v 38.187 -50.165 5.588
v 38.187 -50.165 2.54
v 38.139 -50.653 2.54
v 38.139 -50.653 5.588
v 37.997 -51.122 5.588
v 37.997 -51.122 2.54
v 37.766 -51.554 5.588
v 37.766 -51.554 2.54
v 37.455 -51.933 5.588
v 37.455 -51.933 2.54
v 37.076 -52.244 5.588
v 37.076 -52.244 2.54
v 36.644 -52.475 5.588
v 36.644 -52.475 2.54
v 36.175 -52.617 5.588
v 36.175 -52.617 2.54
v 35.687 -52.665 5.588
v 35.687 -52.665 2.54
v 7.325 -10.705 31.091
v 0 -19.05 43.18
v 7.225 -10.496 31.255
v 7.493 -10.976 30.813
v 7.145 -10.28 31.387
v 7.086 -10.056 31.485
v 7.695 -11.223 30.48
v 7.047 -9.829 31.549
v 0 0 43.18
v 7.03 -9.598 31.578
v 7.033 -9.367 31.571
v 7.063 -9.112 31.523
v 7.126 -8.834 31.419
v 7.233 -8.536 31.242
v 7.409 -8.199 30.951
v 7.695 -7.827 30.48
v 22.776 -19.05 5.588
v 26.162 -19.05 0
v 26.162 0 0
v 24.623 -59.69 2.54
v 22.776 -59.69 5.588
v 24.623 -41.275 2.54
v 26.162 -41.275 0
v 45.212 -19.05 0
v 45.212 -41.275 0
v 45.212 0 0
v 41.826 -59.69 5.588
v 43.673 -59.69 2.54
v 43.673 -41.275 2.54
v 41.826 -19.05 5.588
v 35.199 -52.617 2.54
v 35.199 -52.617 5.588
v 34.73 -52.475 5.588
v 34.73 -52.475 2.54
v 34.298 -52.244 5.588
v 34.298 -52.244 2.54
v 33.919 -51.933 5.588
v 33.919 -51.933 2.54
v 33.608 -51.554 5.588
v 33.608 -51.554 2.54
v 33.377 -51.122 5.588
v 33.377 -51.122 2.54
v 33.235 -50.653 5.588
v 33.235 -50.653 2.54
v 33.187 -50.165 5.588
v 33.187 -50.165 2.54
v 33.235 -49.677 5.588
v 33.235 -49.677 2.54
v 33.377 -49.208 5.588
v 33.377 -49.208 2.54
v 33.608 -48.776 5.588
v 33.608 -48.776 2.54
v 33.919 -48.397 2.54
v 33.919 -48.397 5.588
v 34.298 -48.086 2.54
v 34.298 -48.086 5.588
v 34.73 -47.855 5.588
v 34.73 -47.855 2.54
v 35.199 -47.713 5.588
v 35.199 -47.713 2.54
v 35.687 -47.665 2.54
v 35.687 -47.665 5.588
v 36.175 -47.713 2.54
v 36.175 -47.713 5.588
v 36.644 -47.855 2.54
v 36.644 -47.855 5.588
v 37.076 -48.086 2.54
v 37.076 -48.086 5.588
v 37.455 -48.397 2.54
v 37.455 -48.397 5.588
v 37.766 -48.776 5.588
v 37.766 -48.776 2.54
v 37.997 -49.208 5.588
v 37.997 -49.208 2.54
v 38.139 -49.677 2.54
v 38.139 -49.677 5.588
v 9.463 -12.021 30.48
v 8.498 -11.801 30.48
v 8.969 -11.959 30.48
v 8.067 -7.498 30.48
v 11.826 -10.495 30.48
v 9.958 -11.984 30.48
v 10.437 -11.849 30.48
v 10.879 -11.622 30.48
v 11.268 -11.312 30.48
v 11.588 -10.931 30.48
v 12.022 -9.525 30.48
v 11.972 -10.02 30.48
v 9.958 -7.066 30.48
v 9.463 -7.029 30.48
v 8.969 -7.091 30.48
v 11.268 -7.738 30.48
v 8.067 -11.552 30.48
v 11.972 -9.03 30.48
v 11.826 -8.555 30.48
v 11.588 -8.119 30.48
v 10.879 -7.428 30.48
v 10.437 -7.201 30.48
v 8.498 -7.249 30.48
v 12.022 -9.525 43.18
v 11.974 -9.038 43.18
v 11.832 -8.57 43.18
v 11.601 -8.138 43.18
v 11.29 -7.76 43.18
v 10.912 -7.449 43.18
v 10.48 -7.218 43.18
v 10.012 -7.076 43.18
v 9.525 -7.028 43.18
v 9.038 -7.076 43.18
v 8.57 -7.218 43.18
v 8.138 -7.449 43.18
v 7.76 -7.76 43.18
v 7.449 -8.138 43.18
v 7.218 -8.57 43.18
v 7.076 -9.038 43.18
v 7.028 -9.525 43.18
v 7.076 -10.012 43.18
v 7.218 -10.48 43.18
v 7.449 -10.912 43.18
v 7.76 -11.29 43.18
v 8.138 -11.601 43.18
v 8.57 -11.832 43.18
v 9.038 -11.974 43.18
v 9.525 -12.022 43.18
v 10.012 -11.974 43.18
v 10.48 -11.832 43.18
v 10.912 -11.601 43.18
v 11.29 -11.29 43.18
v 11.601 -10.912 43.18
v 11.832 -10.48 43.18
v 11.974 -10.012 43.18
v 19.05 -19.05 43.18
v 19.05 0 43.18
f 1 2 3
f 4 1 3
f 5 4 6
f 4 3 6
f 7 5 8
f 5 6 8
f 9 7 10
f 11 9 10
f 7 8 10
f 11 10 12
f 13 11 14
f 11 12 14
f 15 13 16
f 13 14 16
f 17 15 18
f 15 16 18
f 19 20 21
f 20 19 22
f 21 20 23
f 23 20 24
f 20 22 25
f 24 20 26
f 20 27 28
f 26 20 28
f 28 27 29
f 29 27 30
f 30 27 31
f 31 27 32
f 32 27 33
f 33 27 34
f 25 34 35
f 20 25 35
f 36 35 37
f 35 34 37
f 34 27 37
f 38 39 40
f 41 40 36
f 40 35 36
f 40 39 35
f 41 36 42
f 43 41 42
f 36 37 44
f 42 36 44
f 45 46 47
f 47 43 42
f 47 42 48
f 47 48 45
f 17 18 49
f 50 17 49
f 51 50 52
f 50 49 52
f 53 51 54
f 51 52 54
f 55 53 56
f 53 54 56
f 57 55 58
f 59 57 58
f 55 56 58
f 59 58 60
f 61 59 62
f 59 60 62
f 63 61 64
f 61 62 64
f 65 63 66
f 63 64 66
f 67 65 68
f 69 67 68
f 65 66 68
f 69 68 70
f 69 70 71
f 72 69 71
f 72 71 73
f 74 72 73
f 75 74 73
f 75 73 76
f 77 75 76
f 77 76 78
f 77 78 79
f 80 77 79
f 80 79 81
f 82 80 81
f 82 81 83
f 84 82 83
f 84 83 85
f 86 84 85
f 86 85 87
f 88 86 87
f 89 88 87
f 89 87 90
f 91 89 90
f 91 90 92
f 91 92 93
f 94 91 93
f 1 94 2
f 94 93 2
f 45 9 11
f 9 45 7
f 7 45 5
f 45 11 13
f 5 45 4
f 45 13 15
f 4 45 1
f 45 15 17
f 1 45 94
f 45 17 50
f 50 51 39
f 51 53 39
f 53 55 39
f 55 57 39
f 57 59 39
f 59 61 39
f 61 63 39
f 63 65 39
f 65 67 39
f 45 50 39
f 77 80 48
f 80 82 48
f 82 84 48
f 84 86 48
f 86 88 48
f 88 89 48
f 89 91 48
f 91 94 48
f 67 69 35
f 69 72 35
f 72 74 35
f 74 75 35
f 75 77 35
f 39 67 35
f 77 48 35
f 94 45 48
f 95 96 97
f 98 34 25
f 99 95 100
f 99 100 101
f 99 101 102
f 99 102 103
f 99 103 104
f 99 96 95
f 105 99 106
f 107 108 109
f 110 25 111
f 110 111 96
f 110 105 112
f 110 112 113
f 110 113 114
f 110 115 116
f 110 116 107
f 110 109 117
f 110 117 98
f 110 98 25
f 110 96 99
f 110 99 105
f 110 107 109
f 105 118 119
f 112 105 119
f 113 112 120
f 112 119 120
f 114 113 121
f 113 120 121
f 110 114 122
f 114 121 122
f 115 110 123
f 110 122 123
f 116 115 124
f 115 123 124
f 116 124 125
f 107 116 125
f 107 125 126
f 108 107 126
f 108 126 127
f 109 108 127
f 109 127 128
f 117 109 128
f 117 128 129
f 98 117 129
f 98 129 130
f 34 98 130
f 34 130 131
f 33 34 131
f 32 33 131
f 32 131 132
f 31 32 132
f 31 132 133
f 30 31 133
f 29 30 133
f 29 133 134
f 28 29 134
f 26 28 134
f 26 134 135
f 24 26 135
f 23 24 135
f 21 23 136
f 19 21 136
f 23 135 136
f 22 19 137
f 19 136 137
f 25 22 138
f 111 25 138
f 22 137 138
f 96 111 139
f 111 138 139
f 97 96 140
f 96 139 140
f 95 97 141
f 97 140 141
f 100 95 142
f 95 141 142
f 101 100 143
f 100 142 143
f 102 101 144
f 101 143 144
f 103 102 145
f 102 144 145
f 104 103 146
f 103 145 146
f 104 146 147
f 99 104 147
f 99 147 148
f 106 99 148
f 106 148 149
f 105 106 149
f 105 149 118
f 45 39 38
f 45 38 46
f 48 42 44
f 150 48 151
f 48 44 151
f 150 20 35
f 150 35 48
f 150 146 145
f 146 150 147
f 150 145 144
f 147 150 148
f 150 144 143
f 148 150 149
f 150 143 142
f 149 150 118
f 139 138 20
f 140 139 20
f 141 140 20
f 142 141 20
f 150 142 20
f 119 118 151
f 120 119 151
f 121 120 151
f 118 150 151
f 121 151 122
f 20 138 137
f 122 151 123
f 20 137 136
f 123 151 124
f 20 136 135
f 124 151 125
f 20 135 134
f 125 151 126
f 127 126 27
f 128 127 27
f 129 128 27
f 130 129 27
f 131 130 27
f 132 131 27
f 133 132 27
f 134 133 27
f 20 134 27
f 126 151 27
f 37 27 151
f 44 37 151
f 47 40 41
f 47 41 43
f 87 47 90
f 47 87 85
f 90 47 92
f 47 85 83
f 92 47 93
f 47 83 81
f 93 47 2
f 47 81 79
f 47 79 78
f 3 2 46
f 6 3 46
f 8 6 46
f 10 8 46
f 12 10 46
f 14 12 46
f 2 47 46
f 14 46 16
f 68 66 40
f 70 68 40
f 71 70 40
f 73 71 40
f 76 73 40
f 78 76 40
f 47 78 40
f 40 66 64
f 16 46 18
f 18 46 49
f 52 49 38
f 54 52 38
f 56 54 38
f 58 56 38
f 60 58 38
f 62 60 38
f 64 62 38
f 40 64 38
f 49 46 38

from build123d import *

# Parameters (mm, degrees)
F1_DEPTH = 19.05
F3_DEPTH = 40.64
F4_R     = 2.496566
F5_DEPTH = 12.7
F7_DEPTH = 43.181
F9_DEPTH = 18.415


with BuildPart() as f1:
    # F0 (on Front) → F1 (new body)
    with BuildSketch(Plane.XZ):
        Polygon((19.05, 43.18), (0, 43.18), (26.162, 0), (35.687, 0), (45.212, 0), align=None)
    extrude(amount=F1_DEPTH)

    # F2 (on face) → F3 (join)
    with BuildSketch(Plane.XZ.offset(19.05)):
        Polygon((41.8263294118, 5.588), (22.7763294118, 5.588), (26.162, 0), (45.212, 0), align=None)
    extrude(amount=F3_DEPTH)

    # F4 (on face) → F5 (cut)
    with BuildSketch(Plane.XY.offset(43.18)):
        with Locations((9.525, -9.525)):
            Circle(F4_R)
    extrude(amount=-F5_DEPTH, mode=Mode.SUBTRACT)

    # F6 (on face) → F7 (cut, through all)
    with BuildSketch(Plane(origin=(0, 0, 0), x_dir=(1, 0, 0), z_dir=(0, 0, -1))):
        with BuildLine():
            ThreePointArc((38.186995, 50.165), (37.4547634174, 51.9327634174), (35.687, 52.664995))
            ThreePointArc((35.687, 52.664995), (33.9192365826, 48.3972365826), (38.186995, 50.165))
        make_face()
    extrude(amount=-F7_DEPTH, mode=Mode.SUBTRACT)

    # F8 (on face) → F9 (cut)
    with BuildSketch(Plane.XZ.offset(59.69)):
        Polygon((43.6730588235, 2.54), (24.6230588235, 2.54), (26.162, 0), (45.212, 0), align=None)
    extrude(amount=-F9_DEPTH, mode=Mode.SUBTRACT)


solid = f1.part
